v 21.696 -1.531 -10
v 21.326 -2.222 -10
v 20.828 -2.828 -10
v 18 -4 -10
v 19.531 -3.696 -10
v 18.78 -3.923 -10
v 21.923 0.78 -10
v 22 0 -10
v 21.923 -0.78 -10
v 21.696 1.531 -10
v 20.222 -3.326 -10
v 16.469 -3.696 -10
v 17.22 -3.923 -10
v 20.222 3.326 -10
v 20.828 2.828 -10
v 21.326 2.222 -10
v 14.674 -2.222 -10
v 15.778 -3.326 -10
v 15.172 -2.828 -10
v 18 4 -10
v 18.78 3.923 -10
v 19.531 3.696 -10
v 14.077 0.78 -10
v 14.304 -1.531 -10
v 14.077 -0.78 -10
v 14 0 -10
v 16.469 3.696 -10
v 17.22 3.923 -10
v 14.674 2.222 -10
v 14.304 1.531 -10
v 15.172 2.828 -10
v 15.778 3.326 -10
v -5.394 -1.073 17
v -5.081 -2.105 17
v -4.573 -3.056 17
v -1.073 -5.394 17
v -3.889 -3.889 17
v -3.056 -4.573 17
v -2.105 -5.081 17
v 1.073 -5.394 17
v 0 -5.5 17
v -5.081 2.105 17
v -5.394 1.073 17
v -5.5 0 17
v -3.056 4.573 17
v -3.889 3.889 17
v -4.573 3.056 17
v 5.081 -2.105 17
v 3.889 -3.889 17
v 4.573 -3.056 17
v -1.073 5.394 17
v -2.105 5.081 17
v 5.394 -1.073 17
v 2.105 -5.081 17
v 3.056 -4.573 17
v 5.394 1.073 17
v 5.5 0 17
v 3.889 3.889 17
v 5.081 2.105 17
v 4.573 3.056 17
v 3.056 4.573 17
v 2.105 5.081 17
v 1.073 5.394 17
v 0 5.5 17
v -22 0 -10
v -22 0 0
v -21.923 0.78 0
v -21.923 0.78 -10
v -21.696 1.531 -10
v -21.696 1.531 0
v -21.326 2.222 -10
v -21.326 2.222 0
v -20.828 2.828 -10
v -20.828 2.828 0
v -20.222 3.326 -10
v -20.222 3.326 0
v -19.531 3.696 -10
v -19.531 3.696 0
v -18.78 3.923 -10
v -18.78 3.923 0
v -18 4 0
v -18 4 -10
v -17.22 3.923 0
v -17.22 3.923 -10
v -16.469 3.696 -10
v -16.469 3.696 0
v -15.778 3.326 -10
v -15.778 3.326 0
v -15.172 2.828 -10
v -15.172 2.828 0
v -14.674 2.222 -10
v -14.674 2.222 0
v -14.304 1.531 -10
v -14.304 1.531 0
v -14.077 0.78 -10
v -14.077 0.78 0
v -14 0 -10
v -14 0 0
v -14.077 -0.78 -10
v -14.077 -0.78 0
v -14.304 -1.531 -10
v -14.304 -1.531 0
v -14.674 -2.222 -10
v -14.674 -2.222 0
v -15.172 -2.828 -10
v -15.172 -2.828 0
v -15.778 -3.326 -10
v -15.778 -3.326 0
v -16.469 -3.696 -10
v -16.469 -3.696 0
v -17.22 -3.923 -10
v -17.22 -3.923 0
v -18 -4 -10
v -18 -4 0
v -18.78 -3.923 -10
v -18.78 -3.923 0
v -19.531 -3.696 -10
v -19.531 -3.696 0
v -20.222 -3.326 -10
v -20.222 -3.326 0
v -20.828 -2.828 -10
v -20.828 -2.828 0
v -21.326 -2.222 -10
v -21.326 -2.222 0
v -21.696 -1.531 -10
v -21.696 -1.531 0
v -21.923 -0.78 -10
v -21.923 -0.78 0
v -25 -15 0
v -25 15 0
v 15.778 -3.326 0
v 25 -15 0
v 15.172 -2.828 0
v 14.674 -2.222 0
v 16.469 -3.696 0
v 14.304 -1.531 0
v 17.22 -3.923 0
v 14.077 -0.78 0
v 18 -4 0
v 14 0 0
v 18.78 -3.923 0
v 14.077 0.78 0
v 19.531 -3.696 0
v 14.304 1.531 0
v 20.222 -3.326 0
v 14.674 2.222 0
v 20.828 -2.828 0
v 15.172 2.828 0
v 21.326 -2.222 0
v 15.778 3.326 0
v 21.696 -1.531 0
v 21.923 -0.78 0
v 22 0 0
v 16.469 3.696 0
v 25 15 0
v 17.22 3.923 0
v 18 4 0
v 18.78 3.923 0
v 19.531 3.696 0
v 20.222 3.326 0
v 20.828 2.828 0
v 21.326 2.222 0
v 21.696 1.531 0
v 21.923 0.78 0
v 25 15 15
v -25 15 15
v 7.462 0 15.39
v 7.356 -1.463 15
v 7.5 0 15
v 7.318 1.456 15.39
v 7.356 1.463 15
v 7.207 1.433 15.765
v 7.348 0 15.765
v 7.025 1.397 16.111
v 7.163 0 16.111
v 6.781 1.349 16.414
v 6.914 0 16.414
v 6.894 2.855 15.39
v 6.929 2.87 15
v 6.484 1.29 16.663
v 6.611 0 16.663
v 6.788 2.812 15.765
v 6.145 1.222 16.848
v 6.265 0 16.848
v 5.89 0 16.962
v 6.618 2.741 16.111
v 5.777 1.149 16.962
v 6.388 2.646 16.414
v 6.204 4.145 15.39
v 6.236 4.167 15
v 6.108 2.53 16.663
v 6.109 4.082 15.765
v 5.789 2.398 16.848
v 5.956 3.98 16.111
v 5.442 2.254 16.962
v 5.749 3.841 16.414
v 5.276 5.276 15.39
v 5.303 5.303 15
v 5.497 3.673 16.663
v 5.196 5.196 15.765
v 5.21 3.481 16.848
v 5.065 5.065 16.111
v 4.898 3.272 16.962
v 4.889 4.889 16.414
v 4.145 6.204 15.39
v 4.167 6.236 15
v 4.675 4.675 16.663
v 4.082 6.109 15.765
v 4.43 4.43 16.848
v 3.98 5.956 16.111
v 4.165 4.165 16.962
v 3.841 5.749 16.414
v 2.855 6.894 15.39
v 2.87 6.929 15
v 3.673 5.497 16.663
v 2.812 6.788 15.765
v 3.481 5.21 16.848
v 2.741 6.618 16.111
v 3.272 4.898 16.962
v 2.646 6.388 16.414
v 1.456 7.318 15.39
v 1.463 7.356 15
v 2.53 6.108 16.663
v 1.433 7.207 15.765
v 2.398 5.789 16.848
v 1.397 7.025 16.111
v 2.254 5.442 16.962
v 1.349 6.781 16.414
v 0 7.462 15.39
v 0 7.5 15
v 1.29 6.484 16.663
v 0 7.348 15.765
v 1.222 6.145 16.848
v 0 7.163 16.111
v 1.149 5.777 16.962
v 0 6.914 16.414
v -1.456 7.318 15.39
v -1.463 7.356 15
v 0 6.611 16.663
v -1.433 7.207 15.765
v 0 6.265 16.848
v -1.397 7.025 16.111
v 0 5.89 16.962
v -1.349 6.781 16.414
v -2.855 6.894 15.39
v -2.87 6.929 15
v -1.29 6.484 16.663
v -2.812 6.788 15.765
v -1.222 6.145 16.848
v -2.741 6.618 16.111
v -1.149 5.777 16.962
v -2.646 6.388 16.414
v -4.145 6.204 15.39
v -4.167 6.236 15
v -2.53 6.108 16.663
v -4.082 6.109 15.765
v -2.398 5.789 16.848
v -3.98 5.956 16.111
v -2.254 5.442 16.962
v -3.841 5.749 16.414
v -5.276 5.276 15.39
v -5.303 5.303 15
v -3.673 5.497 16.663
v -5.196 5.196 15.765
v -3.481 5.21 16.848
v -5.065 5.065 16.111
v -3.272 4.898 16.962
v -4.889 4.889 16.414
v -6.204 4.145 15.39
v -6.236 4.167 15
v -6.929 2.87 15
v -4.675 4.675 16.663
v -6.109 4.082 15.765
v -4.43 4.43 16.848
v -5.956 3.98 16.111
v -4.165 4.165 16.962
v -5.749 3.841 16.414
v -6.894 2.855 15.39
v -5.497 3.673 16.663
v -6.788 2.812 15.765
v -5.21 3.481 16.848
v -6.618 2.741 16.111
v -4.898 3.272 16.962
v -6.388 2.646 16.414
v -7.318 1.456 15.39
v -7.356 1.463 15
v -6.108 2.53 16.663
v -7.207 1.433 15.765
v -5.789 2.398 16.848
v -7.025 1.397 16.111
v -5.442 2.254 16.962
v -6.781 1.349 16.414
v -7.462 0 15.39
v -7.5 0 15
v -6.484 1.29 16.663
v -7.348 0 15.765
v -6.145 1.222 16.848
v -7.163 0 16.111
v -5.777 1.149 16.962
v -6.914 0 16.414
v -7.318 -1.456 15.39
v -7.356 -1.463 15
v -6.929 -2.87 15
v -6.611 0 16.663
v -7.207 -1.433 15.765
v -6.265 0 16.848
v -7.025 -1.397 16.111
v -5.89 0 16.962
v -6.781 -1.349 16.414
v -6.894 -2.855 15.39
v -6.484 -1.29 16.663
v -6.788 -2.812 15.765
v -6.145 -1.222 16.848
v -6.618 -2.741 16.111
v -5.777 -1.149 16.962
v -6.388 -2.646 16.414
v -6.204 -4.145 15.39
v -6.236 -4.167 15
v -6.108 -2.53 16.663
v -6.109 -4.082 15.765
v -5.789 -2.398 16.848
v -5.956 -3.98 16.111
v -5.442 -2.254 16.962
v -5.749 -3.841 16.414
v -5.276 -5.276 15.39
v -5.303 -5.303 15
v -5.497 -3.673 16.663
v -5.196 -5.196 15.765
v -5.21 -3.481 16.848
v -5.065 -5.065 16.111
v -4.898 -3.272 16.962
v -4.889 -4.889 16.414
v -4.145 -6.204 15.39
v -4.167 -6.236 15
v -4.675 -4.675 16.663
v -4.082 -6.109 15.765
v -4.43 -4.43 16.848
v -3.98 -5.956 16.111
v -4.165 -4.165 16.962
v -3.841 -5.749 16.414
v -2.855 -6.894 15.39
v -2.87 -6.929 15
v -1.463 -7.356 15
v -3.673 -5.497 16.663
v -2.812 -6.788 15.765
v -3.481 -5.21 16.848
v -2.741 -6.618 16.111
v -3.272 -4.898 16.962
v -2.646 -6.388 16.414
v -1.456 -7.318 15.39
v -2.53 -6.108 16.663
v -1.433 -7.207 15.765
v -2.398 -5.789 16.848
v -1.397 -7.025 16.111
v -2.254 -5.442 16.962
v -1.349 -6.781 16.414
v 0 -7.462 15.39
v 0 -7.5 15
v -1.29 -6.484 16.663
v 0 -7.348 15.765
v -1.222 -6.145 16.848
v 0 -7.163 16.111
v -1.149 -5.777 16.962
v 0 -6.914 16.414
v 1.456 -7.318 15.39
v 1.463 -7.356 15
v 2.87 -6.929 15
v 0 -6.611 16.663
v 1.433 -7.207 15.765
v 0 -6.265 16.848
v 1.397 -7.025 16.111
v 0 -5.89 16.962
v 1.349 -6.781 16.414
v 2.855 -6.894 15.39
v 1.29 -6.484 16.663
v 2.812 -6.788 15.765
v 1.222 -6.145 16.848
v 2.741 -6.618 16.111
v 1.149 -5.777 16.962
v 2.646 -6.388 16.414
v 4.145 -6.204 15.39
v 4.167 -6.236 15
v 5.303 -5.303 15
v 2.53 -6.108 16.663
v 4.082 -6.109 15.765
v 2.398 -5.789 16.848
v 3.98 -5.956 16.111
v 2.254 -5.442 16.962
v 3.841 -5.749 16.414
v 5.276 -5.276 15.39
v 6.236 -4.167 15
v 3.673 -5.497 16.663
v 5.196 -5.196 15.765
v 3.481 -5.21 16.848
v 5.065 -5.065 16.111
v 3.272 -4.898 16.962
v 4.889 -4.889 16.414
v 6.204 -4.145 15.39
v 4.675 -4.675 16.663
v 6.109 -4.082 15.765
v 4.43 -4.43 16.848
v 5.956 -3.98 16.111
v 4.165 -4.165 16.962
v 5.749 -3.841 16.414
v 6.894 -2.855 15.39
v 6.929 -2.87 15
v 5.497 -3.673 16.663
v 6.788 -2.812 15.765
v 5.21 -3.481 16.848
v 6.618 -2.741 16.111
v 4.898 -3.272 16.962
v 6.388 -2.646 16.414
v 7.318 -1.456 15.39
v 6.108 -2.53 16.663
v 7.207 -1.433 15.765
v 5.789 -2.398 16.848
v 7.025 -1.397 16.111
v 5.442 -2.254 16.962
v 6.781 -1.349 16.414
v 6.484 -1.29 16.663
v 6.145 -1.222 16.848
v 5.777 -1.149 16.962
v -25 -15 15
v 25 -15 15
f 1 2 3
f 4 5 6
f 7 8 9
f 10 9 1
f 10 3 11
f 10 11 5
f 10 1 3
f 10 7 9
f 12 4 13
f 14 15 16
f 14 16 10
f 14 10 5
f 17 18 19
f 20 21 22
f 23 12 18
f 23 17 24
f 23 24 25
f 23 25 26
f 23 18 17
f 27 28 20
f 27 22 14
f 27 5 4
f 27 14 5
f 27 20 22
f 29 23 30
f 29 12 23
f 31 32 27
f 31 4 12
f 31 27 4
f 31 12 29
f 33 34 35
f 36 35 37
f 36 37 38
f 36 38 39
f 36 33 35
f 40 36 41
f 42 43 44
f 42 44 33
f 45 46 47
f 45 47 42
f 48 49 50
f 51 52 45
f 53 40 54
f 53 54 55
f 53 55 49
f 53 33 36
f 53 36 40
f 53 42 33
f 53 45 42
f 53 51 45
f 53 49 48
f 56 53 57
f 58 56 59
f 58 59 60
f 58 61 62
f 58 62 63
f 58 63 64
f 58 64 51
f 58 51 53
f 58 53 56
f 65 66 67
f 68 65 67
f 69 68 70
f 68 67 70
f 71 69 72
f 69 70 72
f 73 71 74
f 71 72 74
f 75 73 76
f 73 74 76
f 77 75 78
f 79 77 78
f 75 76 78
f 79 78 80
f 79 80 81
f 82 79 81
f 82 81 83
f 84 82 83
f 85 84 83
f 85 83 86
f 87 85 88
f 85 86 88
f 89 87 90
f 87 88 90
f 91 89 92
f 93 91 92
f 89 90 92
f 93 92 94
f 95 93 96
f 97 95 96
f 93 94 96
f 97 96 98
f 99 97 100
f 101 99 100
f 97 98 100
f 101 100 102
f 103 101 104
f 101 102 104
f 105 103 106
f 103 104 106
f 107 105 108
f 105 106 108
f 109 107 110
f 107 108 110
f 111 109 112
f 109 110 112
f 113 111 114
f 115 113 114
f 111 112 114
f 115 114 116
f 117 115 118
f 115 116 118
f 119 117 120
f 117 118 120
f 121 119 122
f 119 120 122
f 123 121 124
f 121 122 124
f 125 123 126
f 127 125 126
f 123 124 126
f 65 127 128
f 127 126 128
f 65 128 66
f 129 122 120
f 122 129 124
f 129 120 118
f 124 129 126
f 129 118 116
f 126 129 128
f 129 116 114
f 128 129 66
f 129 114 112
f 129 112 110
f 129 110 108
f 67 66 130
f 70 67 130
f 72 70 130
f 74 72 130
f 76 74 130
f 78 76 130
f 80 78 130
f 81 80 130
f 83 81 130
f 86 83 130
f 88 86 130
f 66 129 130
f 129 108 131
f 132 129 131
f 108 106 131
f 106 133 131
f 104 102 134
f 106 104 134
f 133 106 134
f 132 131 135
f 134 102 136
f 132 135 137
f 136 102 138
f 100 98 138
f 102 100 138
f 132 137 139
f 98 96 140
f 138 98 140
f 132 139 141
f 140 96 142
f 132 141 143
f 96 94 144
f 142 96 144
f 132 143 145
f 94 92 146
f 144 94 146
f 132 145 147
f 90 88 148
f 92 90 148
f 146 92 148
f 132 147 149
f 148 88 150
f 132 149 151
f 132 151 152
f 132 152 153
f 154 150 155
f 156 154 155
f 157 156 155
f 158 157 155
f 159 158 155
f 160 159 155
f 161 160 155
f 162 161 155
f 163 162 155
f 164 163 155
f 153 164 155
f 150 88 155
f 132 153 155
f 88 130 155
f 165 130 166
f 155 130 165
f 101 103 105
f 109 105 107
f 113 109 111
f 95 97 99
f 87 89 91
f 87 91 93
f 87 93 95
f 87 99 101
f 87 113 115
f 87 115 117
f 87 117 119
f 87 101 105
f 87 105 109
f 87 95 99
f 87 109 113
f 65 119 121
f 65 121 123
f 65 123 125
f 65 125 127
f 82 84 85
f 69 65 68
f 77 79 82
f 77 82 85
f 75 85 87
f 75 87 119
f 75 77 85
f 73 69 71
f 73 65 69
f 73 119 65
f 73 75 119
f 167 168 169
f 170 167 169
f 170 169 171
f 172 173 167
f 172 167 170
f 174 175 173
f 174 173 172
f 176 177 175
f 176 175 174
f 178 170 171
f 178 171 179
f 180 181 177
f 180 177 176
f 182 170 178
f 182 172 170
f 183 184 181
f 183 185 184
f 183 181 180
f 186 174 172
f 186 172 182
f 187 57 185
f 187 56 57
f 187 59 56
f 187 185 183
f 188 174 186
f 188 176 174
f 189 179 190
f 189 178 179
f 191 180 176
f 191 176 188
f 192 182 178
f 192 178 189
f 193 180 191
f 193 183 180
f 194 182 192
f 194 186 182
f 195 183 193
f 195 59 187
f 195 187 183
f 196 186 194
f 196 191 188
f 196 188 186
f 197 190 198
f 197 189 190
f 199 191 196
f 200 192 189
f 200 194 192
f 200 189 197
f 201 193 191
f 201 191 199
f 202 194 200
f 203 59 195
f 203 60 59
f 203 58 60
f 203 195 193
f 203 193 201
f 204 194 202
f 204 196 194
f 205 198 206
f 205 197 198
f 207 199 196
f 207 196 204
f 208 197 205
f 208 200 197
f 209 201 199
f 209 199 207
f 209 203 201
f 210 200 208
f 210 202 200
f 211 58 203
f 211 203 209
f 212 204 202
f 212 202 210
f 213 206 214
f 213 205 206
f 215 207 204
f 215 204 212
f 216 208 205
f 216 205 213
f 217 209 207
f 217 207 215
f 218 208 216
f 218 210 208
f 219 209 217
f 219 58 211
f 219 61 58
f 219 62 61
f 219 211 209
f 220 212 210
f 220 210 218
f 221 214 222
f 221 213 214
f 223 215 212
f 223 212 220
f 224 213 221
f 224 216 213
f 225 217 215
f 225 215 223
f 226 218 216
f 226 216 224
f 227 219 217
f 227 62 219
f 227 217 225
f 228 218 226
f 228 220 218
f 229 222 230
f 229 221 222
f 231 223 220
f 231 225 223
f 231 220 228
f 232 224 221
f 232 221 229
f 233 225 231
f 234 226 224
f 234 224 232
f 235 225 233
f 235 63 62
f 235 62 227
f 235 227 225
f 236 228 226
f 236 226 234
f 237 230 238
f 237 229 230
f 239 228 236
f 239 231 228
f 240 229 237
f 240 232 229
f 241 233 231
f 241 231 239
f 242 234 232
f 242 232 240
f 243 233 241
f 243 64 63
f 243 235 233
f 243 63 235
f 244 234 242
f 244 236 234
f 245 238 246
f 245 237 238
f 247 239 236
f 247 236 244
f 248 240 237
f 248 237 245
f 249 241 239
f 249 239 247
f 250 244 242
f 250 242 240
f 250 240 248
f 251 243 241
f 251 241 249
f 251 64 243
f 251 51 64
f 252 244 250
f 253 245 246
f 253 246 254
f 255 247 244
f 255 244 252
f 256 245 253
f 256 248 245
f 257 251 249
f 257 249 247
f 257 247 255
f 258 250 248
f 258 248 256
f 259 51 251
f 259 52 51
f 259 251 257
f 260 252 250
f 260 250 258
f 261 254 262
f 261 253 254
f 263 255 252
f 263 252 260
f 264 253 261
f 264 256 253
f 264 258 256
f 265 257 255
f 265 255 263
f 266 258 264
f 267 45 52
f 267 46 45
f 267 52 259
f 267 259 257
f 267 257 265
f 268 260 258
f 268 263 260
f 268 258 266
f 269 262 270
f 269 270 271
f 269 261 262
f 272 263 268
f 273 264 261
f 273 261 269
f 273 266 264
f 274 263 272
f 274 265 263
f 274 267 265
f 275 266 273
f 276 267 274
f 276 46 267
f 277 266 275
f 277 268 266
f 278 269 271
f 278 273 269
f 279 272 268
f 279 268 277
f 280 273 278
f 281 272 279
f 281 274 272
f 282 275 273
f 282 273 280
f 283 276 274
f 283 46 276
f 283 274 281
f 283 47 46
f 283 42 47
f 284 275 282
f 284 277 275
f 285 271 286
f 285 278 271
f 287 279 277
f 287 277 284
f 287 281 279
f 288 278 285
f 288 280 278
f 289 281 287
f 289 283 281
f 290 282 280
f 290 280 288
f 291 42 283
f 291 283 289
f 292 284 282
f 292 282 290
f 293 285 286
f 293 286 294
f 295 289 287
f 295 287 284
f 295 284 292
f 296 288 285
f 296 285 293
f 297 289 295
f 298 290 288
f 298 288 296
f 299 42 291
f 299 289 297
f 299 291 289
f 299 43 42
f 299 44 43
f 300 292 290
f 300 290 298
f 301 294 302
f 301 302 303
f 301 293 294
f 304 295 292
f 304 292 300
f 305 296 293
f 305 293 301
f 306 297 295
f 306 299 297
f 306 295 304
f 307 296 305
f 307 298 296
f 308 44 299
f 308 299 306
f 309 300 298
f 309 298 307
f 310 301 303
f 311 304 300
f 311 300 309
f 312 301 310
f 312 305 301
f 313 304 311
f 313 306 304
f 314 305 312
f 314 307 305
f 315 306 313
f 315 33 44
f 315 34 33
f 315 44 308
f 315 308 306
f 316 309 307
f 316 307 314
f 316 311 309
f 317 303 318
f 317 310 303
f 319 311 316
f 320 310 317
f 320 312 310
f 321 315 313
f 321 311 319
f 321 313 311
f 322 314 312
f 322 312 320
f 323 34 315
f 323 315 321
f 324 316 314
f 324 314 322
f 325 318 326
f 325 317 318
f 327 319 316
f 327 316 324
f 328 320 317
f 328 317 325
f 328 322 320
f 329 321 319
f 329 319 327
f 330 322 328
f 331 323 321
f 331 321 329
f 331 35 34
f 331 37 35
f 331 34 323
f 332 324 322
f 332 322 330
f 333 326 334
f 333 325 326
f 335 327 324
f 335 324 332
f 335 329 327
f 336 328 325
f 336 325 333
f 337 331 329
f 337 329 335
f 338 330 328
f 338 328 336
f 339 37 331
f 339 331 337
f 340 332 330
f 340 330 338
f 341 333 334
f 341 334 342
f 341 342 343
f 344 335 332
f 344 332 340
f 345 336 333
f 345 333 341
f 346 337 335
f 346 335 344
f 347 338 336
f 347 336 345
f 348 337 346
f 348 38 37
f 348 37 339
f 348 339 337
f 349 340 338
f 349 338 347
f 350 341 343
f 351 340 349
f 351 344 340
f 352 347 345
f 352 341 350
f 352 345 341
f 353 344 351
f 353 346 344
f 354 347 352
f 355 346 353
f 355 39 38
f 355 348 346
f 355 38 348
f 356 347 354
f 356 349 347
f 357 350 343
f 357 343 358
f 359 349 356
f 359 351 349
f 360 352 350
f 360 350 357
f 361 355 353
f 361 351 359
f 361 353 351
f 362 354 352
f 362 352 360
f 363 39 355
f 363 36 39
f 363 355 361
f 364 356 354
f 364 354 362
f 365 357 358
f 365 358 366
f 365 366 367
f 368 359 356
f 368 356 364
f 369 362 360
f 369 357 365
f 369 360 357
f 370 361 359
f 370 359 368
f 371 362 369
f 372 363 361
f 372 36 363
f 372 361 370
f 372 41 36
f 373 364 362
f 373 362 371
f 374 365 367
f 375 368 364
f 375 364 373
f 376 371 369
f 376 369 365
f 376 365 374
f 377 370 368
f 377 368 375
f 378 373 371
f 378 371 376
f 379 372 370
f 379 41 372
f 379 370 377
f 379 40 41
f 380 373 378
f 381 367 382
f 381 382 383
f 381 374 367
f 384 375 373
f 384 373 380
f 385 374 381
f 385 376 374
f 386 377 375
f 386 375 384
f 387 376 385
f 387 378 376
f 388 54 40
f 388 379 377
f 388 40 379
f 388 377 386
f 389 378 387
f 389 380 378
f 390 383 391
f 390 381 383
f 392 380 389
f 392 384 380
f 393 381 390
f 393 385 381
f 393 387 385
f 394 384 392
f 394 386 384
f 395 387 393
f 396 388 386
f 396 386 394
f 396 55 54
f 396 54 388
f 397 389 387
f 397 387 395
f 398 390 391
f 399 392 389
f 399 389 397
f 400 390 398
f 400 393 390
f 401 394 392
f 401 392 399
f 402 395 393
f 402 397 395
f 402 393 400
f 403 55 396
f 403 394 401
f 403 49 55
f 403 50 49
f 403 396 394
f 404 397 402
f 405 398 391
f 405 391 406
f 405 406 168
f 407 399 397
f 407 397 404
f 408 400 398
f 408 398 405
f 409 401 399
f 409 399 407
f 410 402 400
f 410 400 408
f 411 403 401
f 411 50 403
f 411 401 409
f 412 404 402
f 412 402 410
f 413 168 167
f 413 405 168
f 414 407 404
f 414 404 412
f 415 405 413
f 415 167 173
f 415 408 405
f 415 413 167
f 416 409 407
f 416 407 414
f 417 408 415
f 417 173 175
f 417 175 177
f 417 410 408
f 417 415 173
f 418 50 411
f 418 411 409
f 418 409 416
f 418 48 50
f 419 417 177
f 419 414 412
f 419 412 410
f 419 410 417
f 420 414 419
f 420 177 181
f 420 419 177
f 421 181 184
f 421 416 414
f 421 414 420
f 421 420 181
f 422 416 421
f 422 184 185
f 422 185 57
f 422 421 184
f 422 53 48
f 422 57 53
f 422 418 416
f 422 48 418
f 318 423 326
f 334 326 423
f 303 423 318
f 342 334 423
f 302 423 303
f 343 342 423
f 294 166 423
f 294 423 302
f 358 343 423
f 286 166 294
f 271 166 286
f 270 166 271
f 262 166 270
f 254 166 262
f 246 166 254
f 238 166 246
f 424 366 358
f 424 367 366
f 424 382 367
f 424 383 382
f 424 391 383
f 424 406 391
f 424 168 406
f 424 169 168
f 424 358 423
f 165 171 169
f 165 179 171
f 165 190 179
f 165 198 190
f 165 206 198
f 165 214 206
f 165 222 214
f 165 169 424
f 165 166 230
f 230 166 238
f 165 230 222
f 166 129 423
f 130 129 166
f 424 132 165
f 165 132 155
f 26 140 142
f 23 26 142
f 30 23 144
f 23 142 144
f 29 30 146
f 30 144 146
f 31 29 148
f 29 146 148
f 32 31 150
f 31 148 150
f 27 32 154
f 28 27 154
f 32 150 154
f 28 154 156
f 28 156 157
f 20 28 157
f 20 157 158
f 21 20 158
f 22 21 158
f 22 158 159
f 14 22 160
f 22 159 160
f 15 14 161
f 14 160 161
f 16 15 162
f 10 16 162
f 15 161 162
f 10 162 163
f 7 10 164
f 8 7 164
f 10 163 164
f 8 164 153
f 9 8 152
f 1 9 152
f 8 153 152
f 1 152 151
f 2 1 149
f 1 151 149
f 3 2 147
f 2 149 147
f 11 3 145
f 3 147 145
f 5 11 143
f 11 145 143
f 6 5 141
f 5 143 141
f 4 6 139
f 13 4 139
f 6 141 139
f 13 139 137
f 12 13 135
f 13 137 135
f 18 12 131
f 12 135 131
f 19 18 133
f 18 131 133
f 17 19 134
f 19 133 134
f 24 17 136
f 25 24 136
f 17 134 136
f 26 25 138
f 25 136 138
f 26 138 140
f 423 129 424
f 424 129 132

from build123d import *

# Parameters (mm, degrees)
SKETCH1_W           = 50
SKETCH1_H           = 30
BOSS_EXTRUDE1_DEPTH = 15
SKETCH2_R           = 4
BOSS_EXTRUDE2_DEPTH = 10
SKETCH3_R           = 7.5
BOSS_EXTRUDE3_DEPTH = 2
FILLET1_R           = 2


with BuildPart() as part:
    # Sketch1 → Boss-Extrude1 (new body)
    with BuildSketch(Plane.XY):
        Rectangle(SKETCH1_W, SKETCH1_H)
    extrude(amount=BOSS_EXTRUDE1_DEPTH)

    # Sketch2 → Boss-Extrude2 (add)
    with BuildSketch(Plane(origin=(0, 0, 0), x_dir=(-1, 0, 0), z_dir=(0, 0, -1))):
        with Locations((-18, 0)):
            Circle(SKETCH2_R)
        with Locations((18, 0)):
            Circle(SKETCH2_R)
    extrude(amount=BOSS_EXTRUDE2_DEPTH)

    # Sketch3 → Boss-Extrude3 (add)
    with BuildSketch(Plane.XY.offset(15)):
        Circle(SKETCH3_R)
    extrude(amount=BOSS_EXTRUDE3_DEPTH)

    # Fillet1
    fillet1_edges = [part.edges().sort_by_distance(p)[0] for p in [
        (-7.5, 0, 17),
    ]]
    fillet(fillet1_edges, radius=FILLET1_R - 0.0001)  # a hair under: the kernel refuses the full size


solid = part.part
